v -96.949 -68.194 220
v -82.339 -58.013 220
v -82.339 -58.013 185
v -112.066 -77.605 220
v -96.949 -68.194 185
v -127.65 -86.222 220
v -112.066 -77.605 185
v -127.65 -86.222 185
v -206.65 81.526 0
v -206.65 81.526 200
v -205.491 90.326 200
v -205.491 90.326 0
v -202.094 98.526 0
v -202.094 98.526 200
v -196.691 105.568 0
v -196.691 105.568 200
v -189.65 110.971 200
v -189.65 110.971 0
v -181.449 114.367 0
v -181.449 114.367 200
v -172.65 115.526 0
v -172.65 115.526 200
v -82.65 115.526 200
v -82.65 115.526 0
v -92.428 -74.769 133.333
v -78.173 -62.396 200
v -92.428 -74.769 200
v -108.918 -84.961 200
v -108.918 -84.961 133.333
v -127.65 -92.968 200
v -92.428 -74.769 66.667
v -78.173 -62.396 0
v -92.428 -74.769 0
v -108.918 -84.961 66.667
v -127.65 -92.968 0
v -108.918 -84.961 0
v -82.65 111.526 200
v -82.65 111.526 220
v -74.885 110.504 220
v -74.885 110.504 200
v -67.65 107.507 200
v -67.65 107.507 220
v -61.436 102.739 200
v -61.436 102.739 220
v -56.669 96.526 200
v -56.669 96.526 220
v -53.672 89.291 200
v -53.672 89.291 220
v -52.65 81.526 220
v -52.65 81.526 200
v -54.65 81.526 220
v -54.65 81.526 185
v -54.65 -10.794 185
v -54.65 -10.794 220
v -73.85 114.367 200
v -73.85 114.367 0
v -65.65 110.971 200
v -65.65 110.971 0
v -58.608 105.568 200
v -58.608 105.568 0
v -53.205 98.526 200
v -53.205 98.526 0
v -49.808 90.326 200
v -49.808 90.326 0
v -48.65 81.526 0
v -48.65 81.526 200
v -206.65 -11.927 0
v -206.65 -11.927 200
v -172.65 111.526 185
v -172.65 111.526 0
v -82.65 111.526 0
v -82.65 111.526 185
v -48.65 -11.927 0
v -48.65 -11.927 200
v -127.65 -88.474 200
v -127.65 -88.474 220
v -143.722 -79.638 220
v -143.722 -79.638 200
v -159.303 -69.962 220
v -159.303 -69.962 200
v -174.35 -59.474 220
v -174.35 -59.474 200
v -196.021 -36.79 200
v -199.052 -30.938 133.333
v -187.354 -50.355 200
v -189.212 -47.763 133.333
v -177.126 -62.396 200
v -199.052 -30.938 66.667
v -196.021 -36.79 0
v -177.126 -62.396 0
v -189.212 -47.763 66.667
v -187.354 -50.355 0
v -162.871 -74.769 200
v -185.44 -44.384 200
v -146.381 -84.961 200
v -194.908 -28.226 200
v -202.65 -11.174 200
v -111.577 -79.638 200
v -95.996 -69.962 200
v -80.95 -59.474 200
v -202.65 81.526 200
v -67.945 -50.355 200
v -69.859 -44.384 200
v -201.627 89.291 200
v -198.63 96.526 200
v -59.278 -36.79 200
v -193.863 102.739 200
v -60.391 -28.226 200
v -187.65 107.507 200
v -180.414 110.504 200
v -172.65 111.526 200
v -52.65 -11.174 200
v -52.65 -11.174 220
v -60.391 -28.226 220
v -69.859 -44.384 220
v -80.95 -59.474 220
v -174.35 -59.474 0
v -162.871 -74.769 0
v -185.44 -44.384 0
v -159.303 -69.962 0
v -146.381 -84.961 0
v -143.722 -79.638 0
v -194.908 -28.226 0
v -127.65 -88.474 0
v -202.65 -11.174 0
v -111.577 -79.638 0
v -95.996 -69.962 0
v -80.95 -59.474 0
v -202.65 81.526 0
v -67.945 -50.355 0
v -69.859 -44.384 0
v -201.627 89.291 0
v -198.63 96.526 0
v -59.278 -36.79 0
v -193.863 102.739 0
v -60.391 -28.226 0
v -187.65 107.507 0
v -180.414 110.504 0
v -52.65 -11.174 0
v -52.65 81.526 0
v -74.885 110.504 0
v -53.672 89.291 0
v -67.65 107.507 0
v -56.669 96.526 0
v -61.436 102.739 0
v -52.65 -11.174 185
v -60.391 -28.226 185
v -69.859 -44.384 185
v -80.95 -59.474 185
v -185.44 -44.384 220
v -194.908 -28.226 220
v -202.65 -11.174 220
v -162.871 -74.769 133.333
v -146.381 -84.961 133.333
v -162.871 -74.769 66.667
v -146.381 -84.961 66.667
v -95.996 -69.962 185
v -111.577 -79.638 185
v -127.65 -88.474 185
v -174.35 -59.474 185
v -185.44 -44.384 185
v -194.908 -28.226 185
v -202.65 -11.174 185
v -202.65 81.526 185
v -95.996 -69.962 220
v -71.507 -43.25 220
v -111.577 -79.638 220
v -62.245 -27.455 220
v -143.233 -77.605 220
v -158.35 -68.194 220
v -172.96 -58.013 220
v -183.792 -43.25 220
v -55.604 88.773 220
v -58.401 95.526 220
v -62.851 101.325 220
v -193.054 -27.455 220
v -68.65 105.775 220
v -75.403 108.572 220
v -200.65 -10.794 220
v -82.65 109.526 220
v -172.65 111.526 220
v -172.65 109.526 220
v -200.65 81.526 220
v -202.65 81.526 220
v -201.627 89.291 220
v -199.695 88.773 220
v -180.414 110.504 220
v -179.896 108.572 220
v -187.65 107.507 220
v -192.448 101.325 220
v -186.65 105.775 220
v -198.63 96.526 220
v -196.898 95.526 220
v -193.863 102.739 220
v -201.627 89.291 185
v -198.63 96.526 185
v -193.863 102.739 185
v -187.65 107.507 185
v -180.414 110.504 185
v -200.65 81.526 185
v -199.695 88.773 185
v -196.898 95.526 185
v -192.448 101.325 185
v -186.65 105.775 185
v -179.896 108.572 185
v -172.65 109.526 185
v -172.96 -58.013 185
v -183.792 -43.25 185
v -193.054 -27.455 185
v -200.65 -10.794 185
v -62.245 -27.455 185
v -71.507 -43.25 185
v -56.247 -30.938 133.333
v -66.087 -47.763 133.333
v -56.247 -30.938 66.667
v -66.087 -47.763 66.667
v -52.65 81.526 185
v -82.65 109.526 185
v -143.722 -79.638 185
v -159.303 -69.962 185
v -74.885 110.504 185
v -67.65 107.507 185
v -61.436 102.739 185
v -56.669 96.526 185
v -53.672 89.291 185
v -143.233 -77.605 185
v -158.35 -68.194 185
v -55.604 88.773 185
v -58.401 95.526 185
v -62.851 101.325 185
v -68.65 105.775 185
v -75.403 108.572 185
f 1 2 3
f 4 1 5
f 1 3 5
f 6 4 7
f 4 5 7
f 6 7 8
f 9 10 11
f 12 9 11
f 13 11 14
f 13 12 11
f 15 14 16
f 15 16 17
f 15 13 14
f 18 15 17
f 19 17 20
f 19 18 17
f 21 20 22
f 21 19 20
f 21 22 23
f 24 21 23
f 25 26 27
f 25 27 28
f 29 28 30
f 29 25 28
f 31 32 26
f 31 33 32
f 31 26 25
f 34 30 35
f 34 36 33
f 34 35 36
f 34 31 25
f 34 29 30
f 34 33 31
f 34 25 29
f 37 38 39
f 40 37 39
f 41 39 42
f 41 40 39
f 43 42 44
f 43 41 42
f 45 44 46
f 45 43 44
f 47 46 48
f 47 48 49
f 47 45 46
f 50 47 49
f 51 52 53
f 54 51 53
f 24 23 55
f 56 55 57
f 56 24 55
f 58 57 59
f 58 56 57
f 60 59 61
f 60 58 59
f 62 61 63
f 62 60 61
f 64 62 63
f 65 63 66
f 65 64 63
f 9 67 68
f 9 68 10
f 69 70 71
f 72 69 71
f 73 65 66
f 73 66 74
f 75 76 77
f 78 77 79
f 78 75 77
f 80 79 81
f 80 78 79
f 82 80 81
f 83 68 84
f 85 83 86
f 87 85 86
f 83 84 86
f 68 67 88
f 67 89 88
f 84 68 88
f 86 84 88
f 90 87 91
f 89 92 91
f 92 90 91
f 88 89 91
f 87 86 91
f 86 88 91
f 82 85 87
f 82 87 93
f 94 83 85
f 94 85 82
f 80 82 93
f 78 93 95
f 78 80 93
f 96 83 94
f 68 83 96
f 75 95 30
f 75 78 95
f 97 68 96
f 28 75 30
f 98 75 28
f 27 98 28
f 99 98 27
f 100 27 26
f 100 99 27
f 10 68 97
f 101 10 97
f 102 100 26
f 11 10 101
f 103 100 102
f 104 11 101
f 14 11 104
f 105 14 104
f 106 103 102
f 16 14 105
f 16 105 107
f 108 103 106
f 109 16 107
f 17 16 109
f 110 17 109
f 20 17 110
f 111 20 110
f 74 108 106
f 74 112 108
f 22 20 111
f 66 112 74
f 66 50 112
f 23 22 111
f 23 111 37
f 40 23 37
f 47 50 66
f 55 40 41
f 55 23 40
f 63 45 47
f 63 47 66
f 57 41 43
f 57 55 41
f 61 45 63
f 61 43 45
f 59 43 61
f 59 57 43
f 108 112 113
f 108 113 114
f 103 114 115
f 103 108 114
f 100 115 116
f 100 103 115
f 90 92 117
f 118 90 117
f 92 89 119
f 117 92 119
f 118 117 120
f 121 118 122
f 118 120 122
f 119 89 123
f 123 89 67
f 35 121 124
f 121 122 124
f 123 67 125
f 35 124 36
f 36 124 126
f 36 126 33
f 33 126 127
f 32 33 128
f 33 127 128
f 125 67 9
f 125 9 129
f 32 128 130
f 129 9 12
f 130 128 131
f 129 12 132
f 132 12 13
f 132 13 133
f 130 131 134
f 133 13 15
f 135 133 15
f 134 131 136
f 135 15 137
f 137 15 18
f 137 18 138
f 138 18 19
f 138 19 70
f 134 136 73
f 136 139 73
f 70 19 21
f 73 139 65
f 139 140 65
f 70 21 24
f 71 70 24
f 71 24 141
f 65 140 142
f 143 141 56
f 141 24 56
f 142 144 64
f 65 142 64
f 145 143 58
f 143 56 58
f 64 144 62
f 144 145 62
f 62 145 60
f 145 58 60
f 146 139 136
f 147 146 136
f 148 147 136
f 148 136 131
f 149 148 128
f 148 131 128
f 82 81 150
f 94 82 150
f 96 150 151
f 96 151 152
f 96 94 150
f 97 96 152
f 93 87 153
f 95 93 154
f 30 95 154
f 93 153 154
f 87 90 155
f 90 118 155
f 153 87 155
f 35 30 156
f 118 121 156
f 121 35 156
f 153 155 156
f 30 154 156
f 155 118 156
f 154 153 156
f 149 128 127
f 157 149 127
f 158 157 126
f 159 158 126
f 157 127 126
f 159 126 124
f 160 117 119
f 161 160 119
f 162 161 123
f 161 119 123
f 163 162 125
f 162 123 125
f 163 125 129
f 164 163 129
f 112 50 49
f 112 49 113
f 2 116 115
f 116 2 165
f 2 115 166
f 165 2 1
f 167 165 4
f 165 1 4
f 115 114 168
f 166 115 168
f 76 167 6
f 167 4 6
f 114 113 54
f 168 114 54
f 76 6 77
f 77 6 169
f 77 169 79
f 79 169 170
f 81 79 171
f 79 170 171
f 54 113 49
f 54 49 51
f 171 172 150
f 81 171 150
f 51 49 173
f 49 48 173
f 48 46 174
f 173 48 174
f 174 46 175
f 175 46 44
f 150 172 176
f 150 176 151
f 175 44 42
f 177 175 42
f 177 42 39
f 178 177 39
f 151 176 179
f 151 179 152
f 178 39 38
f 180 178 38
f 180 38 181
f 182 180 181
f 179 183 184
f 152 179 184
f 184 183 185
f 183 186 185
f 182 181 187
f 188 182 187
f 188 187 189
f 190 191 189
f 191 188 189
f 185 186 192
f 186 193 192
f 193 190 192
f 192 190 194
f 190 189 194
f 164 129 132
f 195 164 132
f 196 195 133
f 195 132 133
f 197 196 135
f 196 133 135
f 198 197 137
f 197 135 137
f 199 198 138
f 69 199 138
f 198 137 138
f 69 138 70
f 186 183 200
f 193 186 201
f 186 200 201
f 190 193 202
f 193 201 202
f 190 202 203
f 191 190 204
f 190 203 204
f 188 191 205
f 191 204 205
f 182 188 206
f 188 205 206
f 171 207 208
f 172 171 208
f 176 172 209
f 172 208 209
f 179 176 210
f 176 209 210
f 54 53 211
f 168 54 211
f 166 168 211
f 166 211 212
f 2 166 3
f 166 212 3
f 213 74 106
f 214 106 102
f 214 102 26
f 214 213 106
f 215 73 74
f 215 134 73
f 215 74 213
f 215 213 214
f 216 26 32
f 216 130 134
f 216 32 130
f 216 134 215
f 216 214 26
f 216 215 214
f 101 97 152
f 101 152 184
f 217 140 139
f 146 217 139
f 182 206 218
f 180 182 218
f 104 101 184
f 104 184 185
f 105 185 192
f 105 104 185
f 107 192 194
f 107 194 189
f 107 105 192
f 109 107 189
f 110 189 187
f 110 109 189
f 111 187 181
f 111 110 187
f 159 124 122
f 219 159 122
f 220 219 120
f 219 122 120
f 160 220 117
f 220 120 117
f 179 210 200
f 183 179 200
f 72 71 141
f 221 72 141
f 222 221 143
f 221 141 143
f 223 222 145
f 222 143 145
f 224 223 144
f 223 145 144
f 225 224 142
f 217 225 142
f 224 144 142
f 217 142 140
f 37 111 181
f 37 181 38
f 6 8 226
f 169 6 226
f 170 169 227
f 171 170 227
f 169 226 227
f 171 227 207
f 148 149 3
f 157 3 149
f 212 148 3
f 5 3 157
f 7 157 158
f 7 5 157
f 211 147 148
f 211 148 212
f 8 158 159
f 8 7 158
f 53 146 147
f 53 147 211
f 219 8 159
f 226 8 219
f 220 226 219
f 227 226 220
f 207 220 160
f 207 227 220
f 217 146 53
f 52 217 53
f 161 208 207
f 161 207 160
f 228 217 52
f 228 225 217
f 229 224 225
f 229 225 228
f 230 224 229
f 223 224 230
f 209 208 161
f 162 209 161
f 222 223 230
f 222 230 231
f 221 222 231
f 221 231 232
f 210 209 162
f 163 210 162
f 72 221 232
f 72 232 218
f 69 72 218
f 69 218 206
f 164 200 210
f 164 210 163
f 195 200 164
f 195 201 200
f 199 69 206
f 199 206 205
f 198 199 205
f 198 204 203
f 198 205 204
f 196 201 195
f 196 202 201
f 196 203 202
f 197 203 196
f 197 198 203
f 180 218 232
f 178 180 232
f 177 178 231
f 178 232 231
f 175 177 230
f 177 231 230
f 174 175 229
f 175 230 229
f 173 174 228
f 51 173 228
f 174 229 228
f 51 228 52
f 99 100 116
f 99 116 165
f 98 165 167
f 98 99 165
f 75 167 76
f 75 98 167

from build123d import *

# Parameters (mm, degrees)
EXTRU_MINCE2_DEPTH      = 200
EPAISSIR5_DEPTH         = 200
EPAISSIR7_DEPTH         = 200
EXTRU_MINCE3_DEPTH      = 20
EXTRU_MINCE3_DEPTH_BACK = 15


# Read off the part's stored shape, not the designer's step: Epaissir5, Epaissir7
with BuildPart() as part:
    # Esquisse3 → Extru.-Mince2 (new body)
    with BuildSketch(Plane.XY):
        with BuildLine():
            Line((-206.649507199, -11.92714811), (-206.649507199, -3.47401752))
            Line((-206.649507199, -3.47401752), (-206.649507199, 81.52598248))
            ThreePointArc((-206.649507199, 81.52598248), (-196.691137759, 105.56761304), (-172.649507199, 115.52598248))
            Line((-172.649507199, 115.52598248), (-82.649507199, 115.52598248))
            ThreePointArc((-82.649507199, 115.52598248), (-58.607876638, 105.56761304), (-48.649507199, 81.52598248))
            Line((-48.649507199, 81.52598248), (-48.649507199, -11.92714811))
            ThreePointArc((-48.649507199, -11.92714811), (-61.399009455, -38.338842544), (-78.173060849, -62.396244951))
            ThreePointArc((-78.173060849, -62.396244951), (-102.275198337, -78.711501116), (-127.649507199, -92.967905467))
            ThreePointArc((-127.649507199, -92.967905467), (-153.023816061, -78.711501116), (-177.125953549, -62.396244951))
            ThreePointArc((-177.125953549, -62.396244951), (-193.900004942, -38.338842544), (-206.649507199, -11.92714811))
        make_face()
        with BuildLine():
            Line((-202.649507199, -11.17401752), (-202.649507199, -3.47401752))
            Line((-202.649507199, -3.47401752), (-202.649507199, 81.52598248))
            ThreePointArc((-202.649507199, 81.52598248), (-193.862710634, 102.739185916), (-172.649507199, 111.52598248))
            Line((-172.649507199, 111.52598248), (-82.649507199, 111.52598248))
            ThreePointArc((-82.649507199, 111.52598248), (-61.436303763, 102.739185916), (-52.649507199, 81.52598248))
            Line((-52.649507199, 81.52598248), (-52.649507199, -11.17401752))
            ThreePointArc((-52.649507199, -11.17401752), (-64.915375774, -36.427970301), (-80.949507199, -59.47401752))
            ThreePointArc((-80.949507199, -59.47401752), (-103.722688687, -74.902894226), (-127.649507199, -88.47401752))
            ThreePointArc((-127.649507199, -88.47401752), (-151.57632571, -74.902894226), (-174.349507199, -59.47401752))
            ThreePointArc((-174.349507199, -59.47401752), (-190.383638623, -36.427970301), (-202.649507199, -11.17401752))
        make_face(mode=Mode.SUBTRACT)
    extrude(amount=EXTRU_MINCE2_DEPTH)

    # Epaissir5 outline → Epaissir5 (add)
    with BuildSketch(Plane.XY):
        with BuildLine():
            add(Edge.make_bspline(
                [(-78.173060849, -62.396244951), (-91.313583381, -75.858349648), (-107.794638855, -86.055391974), (-127.649507199, -92.967905467)],
                knots=[0.501331546, 0.501331546, 0.501331546, 0.501331546, 1, 1, 1, 1], degree=3))
            ThreePointArc((-78.173060849, -62.396244951), (-102.275198337, -78.711501116), (-127.649507199, -92.967905467))
        make_face()
        with BuildLine():
            add(Edge.make_bspline(
                [(-48.649507199, -11.92714811), (-55.127972189, -32.028220402), (-64.962362616, -48.862247174), (-78.173060849, -62.396244951)],
                knots=[0, 0, 0, 0, 0.501331546, 0.501331546, 0.501331546, 0.501331546], degree=3))
            ThreePointArc((-48.649507199, -11.92714811), (-61.399009455, -38.338842545), (-78.173060849, -62.396244951))
        make_face()
    extrude(amount=EPAISSIR5_DEPTH)

    # Epaissir7 outline → Epaissir7 (add)
    with BuildSketch(Plane.XY):
        with BuildLine():
            ThreePointArc((-177.125953549, -62.396244951), (-193.900004942, -38.338842544), (-206.649507199, -11.92714811))
            add(Edge.make_bspline(
                [(-206.649507199, -11.92714811), (-200.171042209, -32.028220402), (-190.336651781, -48.862247174), (-177.125953549, -62.396244951)],
                knots=[0, 0, 0, 0, 0.501331546, 0.501331546, 0.501331546, 0.501331546], degree=3))
        make_face()
        with BuildLine():
            ThreePointArc((-127.649507199, -92.967905467), (-153.023816061, -78.711501116), (-177.125953549, -62.396244951))
            add(Edge.make_bspline(
                [(-177.125953549, -62.396244951), (-163.985431016, -75.858349648), (-147.504375542, -86.055391974), (-127.649507199, -92.967905467)],
                knots=[0.501331546, 0.501331546, 0.501331546, 0.501331546, 1, 1, 1, 1], degree=3))
        make_face()
    extrude(amount=EPAISSIR7_DEPTH)

    # Esquisse7 → Extru.-Mince3 (add, two sides: drawn at the far end of the back side and taken through both)
    with BuildSketch(Plane.XY.offset(200).offset(-EXTRU_MINCE3_DEPTH_BACK)):
        with BuildLine():
            Line((-202.649507199, -11.17401752), (-202.649507199, -3.47401752))
            Line((-202.649507199, -3.47401752), (-202.649507199, 81.52598248))
            ThreePointArc((-202.649507199, 81.52598248), (-193.862710634, 102.739185916), (-172.649507199, 111.52598248))
            Line((-172.649507199, 111.52598248), (-82.649507199, 111.52598248))
            ThreePointArc((-82.649507199, 111.52598248), (-61.436303763, 102.739185916), (-52.649507199, 81.52598248))
            Line((-52.649507199, 81.52598248), (-52.649507199, -11.17401752))
            ThreePointArc((-52.649507199, -11.17401752), (-64.915375774, -36.427970301), (-80.949507199, -59.47401752))
            ThreePointArc((-80.949507199, -59.47401752), (-103.722688687, -74.902894226), (-127.649507199, -88.47401752))
            ThreePointArc((-127.649507199, -88.47401752), (-151.57632571, -74.902894226), (-174.349507199, -59.47401752))
            ThreePointArc((-174.349507199, -59.47401752), (-190.383638623, -36.427970301), (-202.649507199, -11.17401752))
        make_face()
        with BuildLine():
            Line((-200.649507199, -10.794210022), (-200.649507199, -3.47401752))
            Line((-200.649507199, -3.47401752), (-200.649507199, 81.52598248))
            ThreePointArc((-200.649507199, 81.52598248), (-192.448497072, 101.324972353), (-172.649507199, 109.52598248))
            Line((-172.649507199, 109.52598248), (-82.649507199, 109.52598248))
            ThreePointArc((-82.649507199, 109.52598248), (-62.850517326, 101.324972353), (-54.649507199, 81.52598248))
            Line((-54.649507199, 81.52598248), (-54.649507199, -10.794210022))
            ThreePointArc((-54.649507199, -10.794210022), (-66.673062941, -35.471620796), (-82.338728425, -58.013302636))
            ThreePointArc((-82.338728425, -58.013302636), (-104.44621972, -72.997686116), (-127.649507199, -86.221920301))
            ThreePointArc((-127.649507199, -86.221920301), (-150.852794678, -72.997686116), (-172.960285972, -58.013302636))
            ThreePointArc((-172.960285972, -58.013302636), (-188.625951457, -35.471620796), (-200.649507199, -10.794210022))
        make_face(mode=Mode.SUBTRACT)
    extrude(amount=EXTRU_MINCE3_DEPTH + EXTRU_MINCE3_DEPTH_BACK)


solid = part.part
